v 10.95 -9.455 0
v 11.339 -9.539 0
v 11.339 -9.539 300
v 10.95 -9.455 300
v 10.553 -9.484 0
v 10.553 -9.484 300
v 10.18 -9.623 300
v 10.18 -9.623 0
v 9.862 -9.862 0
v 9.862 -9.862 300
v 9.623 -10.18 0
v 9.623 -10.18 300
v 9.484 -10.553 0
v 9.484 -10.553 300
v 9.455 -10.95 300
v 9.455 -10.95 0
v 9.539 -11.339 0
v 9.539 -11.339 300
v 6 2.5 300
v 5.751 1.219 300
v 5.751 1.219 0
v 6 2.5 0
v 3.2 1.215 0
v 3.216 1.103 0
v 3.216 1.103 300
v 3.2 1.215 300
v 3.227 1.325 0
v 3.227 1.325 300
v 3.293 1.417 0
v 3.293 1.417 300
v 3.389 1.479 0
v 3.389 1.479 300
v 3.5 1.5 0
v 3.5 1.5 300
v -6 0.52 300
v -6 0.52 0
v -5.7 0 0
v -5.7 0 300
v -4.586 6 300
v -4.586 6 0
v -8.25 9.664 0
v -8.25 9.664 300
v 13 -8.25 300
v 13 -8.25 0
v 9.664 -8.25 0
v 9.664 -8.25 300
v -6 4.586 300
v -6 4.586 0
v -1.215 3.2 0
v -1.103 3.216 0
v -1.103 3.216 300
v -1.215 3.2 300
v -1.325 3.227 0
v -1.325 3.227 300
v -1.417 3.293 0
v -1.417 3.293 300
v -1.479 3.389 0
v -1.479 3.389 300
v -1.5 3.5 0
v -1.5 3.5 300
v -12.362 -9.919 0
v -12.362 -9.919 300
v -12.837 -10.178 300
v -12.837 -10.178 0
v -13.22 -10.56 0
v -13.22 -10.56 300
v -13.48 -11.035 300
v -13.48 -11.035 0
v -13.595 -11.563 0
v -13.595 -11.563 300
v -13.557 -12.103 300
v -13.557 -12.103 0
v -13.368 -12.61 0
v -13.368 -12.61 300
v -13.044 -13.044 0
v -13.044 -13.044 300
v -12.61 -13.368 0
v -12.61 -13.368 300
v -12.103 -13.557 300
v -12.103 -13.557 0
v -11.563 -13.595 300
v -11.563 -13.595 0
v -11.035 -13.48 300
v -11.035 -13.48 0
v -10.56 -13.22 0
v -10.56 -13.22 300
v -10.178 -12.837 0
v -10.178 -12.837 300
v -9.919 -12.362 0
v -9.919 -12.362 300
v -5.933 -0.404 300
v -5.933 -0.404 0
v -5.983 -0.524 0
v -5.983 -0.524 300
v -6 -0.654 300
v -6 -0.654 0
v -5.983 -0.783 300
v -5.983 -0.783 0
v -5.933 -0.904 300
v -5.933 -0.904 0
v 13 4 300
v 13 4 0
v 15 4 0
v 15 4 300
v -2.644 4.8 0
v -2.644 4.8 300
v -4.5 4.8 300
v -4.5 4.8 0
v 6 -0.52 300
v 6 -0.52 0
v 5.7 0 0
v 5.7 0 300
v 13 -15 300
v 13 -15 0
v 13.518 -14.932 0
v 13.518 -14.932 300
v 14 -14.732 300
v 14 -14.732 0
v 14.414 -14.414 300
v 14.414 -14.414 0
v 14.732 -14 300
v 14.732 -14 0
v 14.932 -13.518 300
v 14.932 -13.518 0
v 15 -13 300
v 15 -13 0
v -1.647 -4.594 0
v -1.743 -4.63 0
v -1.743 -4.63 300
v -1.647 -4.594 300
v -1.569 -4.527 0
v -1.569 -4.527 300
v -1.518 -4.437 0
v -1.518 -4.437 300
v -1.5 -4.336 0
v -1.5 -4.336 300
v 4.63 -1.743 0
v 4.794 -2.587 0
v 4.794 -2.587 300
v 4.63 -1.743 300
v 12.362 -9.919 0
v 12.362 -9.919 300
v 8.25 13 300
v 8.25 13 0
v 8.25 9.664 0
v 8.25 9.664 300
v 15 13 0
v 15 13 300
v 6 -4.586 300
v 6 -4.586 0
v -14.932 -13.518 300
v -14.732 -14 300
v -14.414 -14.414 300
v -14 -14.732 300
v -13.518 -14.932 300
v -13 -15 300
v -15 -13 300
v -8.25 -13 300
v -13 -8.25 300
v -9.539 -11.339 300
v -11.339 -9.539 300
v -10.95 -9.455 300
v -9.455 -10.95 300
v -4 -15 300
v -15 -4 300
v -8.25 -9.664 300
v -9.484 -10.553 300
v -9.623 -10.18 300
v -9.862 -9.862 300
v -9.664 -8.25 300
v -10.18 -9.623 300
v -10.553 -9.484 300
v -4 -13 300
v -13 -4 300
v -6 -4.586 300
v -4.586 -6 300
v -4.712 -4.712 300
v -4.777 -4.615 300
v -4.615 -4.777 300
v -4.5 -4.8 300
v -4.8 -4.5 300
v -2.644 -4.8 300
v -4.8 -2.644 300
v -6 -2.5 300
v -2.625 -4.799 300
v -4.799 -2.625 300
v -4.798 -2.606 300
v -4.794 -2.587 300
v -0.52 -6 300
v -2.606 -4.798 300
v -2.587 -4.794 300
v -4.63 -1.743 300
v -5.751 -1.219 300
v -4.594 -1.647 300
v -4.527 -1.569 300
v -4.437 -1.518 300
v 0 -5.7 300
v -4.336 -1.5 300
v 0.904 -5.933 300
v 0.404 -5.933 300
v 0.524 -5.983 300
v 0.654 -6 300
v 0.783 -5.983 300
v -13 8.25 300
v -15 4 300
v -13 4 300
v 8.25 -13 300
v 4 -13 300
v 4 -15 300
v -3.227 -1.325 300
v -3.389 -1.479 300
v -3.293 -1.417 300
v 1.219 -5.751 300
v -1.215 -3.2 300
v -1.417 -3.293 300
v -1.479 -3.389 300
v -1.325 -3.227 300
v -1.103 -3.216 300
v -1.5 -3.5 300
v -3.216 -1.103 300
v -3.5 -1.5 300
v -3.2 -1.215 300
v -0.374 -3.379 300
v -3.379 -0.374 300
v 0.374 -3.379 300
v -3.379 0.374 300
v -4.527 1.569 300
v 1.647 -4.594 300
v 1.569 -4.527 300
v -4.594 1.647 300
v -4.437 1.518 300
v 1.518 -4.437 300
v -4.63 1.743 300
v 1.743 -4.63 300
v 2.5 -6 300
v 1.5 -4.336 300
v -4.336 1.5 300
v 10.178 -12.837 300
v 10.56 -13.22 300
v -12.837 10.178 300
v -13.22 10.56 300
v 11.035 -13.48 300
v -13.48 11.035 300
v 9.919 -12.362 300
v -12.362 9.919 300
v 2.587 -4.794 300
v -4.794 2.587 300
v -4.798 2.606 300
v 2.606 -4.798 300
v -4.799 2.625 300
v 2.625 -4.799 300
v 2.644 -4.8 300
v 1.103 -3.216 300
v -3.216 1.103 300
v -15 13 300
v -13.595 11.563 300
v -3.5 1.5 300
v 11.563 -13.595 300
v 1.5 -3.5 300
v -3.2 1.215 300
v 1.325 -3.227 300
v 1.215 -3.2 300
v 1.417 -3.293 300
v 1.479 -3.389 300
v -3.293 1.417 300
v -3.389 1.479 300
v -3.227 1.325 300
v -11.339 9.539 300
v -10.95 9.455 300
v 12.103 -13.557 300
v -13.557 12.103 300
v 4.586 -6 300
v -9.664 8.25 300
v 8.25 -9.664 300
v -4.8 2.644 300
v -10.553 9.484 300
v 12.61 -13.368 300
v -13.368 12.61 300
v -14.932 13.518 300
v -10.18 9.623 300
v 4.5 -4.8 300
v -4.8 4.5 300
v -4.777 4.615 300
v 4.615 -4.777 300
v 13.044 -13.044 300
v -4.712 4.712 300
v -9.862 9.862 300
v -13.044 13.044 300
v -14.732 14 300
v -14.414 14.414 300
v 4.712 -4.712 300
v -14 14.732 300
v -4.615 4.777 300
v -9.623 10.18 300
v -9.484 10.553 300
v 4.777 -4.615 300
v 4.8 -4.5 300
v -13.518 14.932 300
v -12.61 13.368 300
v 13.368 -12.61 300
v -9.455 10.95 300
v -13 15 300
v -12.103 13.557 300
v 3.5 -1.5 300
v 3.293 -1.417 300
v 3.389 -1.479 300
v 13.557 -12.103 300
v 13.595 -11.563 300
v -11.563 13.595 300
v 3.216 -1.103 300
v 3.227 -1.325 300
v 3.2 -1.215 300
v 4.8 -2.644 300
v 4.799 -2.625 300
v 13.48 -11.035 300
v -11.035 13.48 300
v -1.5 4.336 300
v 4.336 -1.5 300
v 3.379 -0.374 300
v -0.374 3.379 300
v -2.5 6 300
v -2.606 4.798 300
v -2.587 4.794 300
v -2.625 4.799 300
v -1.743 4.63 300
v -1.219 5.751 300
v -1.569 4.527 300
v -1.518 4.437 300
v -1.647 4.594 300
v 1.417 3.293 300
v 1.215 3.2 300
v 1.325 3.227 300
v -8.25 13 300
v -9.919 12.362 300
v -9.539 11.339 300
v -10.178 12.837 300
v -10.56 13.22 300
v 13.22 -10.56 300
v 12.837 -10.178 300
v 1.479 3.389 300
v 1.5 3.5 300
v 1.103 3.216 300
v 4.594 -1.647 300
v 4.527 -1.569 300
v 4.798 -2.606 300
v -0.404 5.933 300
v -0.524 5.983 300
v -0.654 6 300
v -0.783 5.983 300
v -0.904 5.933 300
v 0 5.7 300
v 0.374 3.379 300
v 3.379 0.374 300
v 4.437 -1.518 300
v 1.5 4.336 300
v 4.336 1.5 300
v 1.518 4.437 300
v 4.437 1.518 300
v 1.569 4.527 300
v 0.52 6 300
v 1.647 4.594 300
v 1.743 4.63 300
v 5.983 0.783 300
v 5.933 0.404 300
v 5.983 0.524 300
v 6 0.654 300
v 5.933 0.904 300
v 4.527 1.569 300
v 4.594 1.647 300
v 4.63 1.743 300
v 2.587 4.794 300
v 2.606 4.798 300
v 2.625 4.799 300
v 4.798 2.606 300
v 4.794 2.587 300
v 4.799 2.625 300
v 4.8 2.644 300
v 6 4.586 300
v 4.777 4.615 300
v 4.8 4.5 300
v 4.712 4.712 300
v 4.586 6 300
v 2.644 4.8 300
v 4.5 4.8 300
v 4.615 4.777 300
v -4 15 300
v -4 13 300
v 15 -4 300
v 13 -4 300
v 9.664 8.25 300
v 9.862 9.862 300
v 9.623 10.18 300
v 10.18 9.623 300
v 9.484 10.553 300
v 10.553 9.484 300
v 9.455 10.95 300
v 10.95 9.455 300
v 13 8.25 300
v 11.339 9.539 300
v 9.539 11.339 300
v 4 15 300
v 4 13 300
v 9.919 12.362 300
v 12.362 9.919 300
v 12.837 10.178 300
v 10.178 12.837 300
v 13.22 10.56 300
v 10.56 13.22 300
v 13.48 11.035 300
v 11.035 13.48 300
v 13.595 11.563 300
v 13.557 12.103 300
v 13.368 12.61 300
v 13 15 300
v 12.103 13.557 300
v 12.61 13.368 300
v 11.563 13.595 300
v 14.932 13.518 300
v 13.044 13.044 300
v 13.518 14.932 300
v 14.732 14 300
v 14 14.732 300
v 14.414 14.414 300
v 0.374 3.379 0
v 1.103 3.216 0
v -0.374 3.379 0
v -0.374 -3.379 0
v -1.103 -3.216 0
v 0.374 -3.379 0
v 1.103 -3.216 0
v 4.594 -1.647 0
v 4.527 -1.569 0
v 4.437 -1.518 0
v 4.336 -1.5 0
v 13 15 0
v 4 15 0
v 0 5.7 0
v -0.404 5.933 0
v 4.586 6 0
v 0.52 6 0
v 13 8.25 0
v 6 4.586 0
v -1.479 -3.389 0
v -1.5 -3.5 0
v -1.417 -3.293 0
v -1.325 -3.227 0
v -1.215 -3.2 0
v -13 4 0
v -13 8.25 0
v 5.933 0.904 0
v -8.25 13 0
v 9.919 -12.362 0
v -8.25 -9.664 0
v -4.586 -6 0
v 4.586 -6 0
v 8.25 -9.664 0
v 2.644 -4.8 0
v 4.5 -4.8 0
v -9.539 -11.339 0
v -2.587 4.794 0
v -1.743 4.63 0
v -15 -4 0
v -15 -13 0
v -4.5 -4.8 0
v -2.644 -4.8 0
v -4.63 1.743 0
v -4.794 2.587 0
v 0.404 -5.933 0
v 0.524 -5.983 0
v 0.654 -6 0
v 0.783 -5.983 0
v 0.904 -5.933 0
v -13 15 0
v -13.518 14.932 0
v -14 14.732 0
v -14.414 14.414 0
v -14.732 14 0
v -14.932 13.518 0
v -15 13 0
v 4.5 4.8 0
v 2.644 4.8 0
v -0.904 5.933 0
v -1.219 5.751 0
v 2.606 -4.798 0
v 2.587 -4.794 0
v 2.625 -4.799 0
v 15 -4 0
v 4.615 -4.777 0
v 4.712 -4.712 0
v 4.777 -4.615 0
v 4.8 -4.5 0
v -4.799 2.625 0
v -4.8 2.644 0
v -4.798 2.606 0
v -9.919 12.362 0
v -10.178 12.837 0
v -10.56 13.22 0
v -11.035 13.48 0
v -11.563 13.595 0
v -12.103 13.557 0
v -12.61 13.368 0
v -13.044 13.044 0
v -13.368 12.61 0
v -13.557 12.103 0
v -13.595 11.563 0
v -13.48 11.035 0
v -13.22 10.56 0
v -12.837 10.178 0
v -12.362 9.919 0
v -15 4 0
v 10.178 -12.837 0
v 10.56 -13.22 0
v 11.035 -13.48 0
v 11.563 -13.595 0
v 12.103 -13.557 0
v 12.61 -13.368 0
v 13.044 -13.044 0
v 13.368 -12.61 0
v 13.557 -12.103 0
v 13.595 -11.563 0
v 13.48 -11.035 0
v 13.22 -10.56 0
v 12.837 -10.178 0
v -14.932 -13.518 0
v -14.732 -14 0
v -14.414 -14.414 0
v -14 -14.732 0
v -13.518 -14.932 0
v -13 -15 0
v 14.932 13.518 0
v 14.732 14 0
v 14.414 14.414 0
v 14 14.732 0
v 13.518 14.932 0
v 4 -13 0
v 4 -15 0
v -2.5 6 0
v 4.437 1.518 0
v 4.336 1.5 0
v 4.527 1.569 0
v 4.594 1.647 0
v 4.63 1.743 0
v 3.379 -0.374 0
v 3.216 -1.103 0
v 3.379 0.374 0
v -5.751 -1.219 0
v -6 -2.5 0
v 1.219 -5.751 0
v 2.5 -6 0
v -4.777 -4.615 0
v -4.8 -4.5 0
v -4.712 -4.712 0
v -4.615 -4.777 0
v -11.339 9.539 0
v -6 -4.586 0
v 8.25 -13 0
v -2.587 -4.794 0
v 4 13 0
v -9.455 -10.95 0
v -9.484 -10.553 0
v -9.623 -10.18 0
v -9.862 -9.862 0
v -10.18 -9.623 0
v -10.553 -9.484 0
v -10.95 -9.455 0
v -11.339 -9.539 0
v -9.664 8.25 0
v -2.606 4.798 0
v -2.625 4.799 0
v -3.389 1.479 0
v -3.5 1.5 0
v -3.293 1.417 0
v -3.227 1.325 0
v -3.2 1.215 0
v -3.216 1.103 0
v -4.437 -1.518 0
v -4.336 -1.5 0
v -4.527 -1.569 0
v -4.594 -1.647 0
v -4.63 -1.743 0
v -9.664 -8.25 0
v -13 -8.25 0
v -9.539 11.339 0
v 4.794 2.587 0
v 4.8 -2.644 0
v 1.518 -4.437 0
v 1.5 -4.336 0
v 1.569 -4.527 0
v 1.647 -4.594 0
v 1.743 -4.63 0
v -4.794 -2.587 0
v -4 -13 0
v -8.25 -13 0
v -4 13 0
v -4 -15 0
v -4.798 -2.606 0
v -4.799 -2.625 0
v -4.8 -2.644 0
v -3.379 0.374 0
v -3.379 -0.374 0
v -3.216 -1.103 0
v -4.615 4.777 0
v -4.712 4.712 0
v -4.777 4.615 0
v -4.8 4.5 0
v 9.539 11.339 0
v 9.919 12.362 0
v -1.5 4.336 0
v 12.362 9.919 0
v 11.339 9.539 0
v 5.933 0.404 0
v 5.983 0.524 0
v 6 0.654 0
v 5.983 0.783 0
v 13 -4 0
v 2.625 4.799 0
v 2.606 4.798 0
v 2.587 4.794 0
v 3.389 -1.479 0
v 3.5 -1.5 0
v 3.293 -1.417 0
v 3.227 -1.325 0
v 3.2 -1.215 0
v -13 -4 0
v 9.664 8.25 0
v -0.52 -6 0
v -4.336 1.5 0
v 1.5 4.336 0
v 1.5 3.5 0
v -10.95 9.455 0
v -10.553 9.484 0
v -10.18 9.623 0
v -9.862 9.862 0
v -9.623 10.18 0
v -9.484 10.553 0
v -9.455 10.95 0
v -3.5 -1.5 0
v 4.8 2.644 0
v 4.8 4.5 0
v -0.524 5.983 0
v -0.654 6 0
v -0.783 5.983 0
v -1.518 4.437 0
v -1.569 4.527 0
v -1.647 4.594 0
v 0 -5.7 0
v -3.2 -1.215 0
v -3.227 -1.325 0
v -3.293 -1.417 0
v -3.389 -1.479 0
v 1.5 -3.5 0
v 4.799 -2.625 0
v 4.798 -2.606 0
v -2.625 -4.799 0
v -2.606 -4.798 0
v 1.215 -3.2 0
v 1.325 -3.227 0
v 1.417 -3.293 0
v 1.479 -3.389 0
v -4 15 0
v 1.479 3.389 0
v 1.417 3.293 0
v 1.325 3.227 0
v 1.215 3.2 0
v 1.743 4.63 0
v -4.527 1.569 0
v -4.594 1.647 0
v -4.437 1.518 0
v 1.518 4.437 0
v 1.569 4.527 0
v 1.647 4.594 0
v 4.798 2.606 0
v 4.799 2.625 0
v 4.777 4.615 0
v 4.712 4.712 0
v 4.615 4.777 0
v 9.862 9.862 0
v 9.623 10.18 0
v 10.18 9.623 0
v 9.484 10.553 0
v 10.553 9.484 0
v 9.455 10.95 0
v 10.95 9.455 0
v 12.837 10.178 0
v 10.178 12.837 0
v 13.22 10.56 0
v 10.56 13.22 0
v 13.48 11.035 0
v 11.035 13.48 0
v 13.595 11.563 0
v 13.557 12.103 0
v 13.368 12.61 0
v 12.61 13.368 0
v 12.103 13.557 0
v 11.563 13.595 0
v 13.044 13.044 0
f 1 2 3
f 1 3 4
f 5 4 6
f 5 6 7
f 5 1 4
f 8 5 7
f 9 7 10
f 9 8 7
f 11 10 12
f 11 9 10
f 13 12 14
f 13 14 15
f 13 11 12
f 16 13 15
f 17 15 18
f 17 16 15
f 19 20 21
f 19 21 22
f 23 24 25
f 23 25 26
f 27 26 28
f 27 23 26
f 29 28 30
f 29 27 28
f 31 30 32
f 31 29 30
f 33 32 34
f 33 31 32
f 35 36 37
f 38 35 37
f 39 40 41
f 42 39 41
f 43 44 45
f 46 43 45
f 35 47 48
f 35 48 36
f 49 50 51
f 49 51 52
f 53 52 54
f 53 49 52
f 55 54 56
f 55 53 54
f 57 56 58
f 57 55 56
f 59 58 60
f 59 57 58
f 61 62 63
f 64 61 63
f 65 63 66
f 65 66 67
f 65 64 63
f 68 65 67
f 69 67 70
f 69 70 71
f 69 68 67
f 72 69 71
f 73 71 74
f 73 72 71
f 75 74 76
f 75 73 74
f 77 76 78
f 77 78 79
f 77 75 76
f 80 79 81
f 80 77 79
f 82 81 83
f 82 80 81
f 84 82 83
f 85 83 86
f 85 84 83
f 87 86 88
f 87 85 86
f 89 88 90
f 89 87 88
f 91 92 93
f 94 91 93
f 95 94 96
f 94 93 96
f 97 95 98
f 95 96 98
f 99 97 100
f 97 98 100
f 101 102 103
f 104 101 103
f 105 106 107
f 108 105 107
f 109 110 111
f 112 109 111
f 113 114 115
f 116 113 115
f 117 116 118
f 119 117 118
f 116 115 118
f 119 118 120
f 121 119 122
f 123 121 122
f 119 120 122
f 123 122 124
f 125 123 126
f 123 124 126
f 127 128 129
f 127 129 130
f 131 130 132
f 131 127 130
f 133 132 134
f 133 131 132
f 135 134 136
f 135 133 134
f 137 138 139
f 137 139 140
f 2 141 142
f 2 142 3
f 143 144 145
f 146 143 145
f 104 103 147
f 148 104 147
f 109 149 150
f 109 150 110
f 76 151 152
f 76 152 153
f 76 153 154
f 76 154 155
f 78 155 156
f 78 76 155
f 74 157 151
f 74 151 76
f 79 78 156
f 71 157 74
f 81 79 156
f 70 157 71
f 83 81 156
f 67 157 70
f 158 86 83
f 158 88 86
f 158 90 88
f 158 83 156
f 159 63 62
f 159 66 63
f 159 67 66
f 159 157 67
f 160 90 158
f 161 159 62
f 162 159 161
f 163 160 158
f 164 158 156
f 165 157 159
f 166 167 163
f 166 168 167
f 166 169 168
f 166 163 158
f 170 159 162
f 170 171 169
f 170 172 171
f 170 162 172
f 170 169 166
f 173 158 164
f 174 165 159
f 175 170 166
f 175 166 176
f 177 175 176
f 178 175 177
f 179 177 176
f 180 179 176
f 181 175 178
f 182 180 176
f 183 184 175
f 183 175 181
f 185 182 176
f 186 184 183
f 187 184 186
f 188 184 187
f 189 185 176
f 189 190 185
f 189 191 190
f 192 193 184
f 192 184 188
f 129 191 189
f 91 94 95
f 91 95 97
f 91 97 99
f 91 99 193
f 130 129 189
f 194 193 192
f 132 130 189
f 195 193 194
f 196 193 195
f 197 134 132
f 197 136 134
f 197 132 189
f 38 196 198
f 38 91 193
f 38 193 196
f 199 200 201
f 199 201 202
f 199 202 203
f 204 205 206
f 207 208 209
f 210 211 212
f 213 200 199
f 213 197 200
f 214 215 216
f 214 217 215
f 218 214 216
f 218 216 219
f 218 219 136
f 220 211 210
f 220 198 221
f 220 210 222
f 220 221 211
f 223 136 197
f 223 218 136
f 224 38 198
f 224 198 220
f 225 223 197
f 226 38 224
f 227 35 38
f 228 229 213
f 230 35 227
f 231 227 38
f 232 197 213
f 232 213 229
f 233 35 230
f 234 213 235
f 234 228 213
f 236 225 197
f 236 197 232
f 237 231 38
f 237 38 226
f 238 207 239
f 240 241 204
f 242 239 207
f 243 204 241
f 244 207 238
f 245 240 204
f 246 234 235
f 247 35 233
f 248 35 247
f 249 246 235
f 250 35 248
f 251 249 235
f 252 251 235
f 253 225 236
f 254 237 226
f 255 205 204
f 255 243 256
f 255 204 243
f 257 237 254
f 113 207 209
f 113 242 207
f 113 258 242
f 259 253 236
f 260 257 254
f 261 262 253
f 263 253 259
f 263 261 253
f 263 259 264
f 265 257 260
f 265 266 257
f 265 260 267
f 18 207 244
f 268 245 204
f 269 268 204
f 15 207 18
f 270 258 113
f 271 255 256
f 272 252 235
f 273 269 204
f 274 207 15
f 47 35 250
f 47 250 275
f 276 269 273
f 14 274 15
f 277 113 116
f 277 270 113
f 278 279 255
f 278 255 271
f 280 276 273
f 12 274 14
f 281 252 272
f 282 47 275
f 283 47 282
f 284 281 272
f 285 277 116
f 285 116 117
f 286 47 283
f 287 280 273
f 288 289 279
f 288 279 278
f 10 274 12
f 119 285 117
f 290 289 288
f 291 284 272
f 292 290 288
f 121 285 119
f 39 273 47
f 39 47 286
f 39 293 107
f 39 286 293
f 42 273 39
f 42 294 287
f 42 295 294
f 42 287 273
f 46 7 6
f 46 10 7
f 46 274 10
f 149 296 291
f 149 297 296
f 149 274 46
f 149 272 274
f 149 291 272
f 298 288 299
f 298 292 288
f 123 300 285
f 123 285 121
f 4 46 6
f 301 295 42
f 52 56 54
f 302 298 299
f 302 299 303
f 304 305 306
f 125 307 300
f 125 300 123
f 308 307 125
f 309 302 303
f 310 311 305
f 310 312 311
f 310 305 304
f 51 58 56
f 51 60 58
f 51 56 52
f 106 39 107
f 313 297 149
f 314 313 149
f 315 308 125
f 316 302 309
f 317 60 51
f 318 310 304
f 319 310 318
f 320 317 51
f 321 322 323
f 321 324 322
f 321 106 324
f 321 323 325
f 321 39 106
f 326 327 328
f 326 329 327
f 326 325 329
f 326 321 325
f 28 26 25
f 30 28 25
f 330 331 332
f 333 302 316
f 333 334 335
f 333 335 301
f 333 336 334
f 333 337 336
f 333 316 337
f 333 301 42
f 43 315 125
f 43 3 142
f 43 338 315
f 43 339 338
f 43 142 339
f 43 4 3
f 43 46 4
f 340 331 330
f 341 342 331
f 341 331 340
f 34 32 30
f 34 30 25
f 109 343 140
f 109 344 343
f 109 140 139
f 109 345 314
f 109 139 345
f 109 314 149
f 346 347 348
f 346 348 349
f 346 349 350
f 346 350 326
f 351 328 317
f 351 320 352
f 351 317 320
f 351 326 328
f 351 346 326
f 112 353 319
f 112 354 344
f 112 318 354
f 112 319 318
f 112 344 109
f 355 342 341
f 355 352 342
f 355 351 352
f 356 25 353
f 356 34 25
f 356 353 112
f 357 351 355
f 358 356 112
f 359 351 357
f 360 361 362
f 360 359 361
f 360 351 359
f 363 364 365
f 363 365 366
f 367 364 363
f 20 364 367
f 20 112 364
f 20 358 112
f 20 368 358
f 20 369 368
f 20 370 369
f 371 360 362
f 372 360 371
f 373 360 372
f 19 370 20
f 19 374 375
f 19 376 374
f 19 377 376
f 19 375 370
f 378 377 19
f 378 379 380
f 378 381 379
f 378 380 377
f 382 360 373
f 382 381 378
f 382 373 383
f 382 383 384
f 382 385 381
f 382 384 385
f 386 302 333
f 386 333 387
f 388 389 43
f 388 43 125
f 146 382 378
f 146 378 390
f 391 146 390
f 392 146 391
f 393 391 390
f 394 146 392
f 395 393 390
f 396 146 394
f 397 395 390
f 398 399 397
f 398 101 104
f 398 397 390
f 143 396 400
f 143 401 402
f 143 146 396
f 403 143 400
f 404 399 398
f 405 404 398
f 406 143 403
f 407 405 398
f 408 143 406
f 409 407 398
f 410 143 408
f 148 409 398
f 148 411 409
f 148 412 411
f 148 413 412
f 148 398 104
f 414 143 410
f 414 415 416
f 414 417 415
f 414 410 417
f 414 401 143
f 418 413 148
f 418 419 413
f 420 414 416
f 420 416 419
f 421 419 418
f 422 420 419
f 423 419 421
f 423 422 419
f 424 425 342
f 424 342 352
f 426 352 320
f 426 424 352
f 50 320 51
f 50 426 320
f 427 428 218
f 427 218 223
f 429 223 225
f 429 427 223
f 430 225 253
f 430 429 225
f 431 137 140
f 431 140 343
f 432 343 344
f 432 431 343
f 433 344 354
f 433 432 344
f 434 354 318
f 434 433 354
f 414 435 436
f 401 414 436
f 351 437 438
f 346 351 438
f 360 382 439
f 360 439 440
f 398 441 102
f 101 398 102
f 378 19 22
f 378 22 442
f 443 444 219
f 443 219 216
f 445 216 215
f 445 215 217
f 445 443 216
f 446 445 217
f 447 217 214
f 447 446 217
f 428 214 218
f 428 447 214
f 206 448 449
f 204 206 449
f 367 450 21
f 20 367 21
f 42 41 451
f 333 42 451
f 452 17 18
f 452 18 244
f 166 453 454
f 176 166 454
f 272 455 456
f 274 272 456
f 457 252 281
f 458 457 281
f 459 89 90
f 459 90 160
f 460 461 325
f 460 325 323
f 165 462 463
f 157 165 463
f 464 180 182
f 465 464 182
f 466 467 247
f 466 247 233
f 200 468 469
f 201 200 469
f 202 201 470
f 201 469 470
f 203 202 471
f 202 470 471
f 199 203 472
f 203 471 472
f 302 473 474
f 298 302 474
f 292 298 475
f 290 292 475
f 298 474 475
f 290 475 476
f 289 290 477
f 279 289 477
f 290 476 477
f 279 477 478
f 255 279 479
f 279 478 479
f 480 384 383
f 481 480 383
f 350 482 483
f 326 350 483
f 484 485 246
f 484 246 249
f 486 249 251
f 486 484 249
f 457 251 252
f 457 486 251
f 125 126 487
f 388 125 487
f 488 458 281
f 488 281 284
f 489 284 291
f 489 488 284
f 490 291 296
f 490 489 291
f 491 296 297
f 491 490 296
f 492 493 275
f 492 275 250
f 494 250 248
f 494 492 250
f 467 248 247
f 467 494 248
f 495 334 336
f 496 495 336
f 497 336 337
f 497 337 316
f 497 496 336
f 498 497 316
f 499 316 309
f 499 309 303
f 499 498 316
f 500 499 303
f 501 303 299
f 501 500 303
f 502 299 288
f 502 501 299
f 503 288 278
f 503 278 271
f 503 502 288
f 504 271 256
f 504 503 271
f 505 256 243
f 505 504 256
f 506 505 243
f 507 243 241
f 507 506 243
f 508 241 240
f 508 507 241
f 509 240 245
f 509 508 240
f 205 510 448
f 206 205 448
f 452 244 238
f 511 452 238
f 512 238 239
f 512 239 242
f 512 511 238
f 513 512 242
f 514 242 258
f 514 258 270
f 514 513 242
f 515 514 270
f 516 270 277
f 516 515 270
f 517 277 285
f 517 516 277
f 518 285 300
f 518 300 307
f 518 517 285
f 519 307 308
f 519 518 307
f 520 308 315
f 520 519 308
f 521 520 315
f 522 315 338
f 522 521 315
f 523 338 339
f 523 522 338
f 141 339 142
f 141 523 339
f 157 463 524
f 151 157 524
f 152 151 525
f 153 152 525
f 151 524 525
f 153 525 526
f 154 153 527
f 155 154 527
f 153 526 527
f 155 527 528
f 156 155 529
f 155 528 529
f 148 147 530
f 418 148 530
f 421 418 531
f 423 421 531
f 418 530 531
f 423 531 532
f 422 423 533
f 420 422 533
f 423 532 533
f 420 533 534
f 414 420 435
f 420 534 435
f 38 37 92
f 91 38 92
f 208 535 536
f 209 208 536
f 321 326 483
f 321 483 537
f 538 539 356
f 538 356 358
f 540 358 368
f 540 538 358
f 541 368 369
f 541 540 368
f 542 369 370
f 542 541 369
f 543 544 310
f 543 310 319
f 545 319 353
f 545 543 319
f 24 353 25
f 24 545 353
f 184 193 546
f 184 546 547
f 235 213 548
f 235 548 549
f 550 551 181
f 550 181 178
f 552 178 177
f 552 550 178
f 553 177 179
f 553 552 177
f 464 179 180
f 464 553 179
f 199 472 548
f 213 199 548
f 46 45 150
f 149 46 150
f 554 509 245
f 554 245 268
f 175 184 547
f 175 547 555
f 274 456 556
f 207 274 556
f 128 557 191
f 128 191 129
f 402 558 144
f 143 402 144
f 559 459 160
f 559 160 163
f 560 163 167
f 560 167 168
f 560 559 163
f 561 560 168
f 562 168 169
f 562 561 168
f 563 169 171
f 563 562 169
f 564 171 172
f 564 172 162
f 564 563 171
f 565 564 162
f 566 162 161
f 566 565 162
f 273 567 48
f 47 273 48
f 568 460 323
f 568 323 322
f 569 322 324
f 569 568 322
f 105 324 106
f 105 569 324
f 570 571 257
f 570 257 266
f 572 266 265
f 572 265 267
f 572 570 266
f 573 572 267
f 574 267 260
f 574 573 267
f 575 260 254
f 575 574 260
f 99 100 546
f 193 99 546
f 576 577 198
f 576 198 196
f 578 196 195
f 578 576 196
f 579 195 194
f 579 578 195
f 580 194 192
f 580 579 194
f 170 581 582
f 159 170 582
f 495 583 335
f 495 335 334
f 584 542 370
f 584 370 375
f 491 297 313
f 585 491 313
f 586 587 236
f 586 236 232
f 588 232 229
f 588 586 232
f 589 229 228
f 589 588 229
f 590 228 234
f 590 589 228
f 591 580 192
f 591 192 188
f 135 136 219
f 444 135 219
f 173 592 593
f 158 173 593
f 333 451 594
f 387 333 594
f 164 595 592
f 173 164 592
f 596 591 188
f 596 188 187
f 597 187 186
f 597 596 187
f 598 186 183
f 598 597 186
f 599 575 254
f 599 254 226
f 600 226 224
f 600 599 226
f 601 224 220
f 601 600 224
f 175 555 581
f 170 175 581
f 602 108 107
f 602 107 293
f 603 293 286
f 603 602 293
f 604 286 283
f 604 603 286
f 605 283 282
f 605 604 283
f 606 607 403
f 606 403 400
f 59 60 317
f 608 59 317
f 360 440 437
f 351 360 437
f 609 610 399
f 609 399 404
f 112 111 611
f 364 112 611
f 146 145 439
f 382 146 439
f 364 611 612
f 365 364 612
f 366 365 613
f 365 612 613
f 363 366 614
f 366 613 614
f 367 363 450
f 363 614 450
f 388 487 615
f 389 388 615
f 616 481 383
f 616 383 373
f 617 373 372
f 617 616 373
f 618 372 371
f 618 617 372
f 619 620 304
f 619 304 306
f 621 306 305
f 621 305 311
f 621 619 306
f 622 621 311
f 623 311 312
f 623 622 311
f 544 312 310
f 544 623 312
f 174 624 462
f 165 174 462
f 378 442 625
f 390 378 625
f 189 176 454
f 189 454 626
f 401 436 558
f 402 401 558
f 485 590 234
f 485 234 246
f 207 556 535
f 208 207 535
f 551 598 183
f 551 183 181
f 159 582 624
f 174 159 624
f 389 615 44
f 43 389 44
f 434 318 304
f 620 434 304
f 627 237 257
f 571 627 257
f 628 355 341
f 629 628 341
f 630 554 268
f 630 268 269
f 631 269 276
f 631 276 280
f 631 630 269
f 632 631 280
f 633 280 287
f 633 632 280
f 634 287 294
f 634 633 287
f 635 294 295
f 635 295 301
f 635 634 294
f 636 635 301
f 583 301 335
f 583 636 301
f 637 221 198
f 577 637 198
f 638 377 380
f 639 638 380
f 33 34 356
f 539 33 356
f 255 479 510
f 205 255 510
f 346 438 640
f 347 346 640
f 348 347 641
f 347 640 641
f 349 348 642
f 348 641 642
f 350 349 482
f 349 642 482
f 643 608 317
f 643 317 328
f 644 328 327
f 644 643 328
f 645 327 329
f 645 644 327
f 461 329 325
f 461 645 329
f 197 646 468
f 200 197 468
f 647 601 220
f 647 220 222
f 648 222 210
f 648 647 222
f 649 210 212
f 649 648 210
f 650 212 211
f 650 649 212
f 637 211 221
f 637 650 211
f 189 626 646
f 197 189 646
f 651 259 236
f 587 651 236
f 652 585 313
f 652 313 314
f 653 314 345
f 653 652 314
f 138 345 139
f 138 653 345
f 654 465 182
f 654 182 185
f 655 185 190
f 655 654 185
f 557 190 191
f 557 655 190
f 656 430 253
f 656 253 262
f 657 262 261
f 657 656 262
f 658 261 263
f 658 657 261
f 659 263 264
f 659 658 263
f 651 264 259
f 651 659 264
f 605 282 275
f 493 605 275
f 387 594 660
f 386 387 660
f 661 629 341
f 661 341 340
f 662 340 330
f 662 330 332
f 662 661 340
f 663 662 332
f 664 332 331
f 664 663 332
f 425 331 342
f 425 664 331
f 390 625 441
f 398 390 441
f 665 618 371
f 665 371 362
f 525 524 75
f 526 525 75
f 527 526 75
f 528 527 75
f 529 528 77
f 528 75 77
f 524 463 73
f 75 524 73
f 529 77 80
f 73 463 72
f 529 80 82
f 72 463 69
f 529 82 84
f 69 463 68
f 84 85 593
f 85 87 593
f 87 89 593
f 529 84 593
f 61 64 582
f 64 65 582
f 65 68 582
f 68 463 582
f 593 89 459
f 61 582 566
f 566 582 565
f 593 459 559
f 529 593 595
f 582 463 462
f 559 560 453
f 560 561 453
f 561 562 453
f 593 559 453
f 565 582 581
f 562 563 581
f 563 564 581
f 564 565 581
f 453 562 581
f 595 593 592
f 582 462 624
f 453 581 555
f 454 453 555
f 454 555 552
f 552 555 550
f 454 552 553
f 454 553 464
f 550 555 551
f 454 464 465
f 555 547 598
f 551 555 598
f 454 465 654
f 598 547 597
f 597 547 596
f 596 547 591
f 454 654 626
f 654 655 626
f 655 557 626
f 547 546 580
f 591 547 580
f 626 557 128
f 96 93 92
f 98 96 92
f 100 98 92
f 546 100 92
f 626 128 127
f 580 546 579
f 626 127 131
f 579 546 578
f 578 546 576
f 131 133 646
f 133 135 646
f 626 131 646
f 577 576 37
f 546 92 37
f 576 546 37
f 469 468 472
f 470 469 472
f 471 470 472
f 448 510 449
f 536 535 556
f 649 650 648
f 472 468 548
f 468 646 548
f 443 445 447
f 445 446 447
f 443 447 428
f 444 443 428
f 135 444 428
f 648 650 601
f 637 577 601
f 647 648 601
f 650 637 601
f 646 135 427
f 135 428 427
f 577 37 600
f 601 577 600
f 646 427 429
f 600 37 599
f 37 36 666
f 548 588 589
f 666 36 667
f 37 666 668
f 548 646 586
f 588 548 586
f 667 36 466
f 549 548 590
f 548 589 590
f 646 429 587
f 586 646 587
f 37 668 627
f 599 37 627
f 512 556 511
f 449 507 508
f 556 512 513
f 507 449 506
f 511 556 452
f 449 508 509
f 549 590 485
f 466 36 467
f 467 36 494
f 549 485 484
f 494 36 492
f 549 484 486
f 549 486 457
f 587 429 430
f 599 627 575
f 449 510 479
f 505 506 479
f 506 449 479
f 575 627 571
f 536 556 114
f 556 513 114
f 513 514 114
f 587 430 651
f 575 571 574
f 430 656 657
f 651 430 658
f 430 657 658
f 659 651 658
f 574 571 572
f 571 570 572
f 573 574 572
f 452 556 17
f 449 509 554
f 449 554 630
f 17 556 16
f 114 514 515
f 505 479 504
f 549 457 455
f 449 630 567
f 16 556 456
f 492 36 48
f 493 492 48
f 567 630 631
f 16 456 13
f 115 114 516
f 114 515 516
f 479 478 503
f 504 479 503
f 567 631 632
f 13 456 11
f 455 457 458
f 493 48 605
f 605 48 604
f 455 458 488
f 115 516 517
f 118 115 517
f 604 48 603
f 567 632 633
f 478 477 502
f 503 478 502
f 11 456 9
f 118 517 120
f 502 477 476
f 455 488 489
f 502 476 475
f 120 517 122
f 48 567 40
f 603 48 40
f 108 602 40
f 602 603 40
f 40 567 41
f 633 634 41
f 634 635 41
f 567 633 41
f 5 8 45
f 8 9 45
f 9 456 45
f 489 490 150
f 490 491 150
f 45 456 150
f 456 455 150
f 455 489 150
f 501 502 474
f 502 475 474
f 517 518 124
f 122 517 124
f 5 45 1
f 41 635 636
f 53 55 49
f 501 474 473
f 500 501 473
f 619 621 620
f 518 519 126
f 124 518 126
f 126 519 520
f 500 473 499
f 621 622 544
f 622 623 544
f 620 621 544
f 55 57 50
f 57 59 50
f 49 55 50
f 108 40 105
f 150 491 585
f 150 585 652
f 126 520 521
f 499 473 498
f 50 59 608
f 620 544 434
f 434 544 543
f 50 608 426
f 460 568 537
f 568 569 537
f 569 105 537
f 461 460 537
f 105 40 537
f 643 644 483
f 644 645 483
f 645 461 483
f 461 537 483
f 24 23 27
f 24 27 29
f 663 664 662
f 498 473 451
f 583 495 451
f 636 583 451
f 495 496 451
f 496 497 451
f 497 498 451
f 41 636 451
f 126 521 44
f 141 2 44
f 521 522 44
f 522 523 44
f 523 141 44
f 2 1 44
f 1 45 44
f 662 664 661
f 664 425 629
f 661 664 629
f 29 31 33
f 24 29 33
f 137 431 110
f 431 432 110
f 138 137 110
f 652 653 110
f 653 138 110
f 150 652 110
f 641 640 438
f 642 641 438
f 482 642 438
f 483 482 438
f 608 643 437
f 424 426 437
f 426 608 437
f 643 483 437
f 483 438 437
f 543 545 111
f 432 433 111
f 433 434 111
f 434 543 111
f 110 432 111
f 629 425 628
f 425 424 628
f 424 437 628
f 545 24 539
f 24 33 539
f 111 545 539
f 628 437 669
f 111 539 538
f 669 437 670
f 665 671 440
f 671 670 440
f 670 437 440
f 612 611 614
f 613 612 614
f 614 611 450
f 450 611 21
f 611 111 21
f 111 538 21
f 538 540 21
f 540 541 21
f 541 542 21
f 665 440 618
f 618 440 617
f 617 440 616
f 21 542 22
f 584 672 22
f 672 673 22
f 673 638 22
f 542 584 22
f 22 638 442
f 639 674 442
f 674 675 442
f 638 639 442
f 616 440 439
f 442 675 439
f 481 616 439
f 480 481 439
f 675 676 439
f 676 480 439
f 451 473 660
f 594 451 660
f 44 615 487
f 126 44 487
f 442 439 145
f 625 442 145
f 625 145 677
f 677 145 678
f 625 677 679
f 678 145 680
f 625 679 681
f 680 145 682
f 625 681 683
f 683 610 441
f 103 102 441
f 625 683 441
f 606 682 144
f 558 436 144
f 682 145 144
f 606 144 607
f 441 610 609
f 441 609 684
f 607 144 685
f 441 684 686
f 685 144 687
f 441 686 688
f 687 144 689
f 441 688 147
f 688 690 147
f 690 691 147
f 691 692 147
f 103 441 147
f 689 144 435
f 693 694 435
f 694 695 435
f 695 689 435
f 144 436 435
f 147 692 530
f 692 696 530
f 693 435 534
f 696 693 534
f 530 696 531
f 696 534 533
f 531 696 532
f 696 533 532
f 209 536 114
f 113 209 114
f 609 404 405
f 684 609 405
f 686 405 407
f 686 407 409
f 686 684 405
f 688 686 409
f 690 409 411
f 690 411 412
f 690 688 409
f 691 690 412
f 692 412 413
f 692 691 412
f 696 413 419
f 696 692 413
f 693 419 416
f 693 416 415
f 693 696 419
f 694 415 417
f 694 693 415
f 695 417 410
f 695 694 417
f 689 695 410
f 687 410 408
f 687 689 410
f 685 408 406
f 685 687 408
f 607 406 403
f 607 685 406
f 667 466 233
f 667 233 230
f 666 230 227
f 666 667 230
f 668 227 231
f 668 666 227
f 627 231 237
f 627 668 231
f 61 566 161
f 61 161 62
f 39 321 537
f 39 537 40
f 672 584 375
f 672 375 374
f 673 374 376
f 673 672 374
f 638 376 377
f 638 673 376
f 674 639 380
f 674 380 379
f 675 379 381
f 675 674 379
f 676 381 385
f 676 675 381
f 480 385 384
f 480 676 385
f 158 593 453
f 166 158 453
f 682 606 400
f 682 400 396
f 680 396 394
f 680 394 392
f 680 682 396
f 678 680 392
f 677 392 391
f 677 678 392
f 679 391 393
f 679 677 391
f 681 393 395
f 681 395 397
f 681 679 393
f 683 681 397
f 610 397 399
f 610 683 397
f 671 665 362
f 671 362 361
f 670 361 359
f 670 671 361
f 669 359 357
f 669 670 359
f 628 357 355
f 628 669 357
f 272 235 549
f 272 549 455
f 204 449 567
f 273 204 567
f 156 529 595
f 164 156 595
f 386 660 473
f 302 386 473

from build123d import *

# Parameters (mm, degrees)
BOSS_EXTRUDE1_DEPTH = 300


with BuildPart() as part:
    # Model → Boss-Extrude1 (new body)
    with BuildSketch(Plane.XY):
        with BuildLine():
            Line((-15, 13), (-15, 4))
            Line((-15, 4), (-13, 4))
            Line((-13, 4), (-13, 8.25))
            Line((-13, 8.25), (-9.664213562, 8.25))
            Line((-9.664213562, 8.25), (-6, 4.585786438))
            Line((-6, 4.585786438), (-6, 0.519615242))
            Line((-6, 0.519615242), (-5.7, 0))
            Line((-5.7, 0), (-5.933012702, -0.403589838))
            ThreePointArc((-5.933012702, -0.403589838), (-6, -0.653589838), (-5.933012702, -0.903589838))
            Line((-5.933012702, -0.903589838), (-5.750976592, -1.218885629))
            Line((-5.750976592, -1.218885629), (-6, -2.5))
            Line((-6, -2.5), (-6, -4.585786438))
            Line((-6, -4.585786438), (-9.664213562, -8.25))
            Line((-9.664213562, -8.25), (-13, -8.25))
            Line((-13, -8.25), (-13, -4))
            Line((-13, -4), (-15, -4))
            Line((-15, -4), (-15, -13))
            ThreePointArc((-15, -13), (-14.414213562, -14.414213562), (-13, -15))
            Line((-13, -15), (-4, -15))
            Line((-4, -15), (-4, -13))
            Line((-4, -13), (-8.25, -13))
            Line((-8.25, -13), (-8.25, -9.664213562))
            Line((-8.25, -9.664213562), (-4.585786438, -6))
            Line((-4.585786438, -6), (-0.519615242, -6))
            Line((-0.519615242, -6), (0, -5.7))
            Line((0, -5.7), (0.403589838, -5.933012702))
            ThreePointArc((0.403589838, -5.933012702), (0.653589838, -6), (0.903589838, -5.933012702))
            Line((0.903589838, -5.933012702), (1.218885629, -5.750976592))
            Line((1.218885629, -5.750976592), (2.5, -6))
            Line((2.5, -6), (4.585786438, -6))
            Line((4.585786438, -6), (8.25, -9.664213562))
            Line((8.25, -9.664213562), (8.25, -13))
            Line((8.25, -13), (4, -13))
            Line((4, -13), (4, -15))
            Line((4, -15), (13, -15))
            ThreePointArc((13, -15), (14.414213562, -14.414213562), (15, -13))
            Line((15, -13), (15, -4))
            Line((15, -4), (13, -4))
            Line((13, -4), (13, -8.25))
            Line((13, -8.25), (9.664213562, -8.25))
            Line((9.664213562, -8.25), (6, -4.585786438))
            Line((6, -4.585786438), (6, -0.519615242))
            Line((6, -0.519615242), (5.7, 0))
            Line((5.7, 0), (5.933012702, 0.403589838))
            ThreePointArc((5.933012702, 0.403589838), (6, 0.653589838), (5.933012702, 0.903589838))
            Line((5.933012702, 0.903589838), (5.750976592, 1.218885629))
            Line((5.750976592, 1.218885629), (6, 2.5))
            Line((6, 2.5), (6, 4.585786438))
            Line((6, 4.585786438), (9.664213562, 8.25))
            Line((9.664213562, 8.25), (13, 8.25))
            Line((13, 8.25), (13, 4))
            Line((13, 4), (15, 4))
            Line((15, 4), (15, 13))
            ThreePointArc((15, 13), (14.414213562, 14.414213562), (13, 15))
            Line((13, 15), (4, 15))
            Line((4, 15), (4, 13))
            Line((4, 13), (8.25, 13))
            Line((8.25, 13), (8.25, 9.664213562))
            Line((8.25, 9.664213562), (4.585786438, 6))
            Line((4.585786438, 6), (0.519615242, 6))
            Line((0.519615242, 6), (0, 5.7))
            Line((0, 5.7), (-0.403589838, 5.933012702))
            ThreePointArc((-0.403589838, 5.933012702), (-0.653589838, 6), (-0.903589838, 5.933012702))
            Line((-0.903589838, 5.933012702), (-1.218885629, 5.750976592))
            Line((-1.218885629, 5.750976592), (-2.5, 6))
            Line((-2.5, 6), (-4.585786438, 6))
            Line((-4.585786438, 6), (-8.25, 9.664213562))
            Line((-8.25, 9.664213562), (-8.25, 13))
            Line((-8.25, 13), (-4, 13))
            Line((-4, 13), (-4, 15))
            Line((-4, 15), (-13, 15))
            ThreePointArc((-13, 15), (-14.414213562, 14.414213562), (-15, 13))
        make_face()
        with BuildLine():
            Line((9.918883282, 12.361530981), (9.539070071, 11.338915743))
            ThreePointArc((9.539070071, 11.338915743), (9.861522369, 9.861522369), (11.338915743, 9.539070071))
            Line((11.338915743, 9.539070071), (12.361530981, 9.918883282))
            ThreePointArc((12.361530981, 9.918883282), (13.043502884, 13.043502884), (9.918883282, 12.361530981))
        make_face(mode=Mode.SUBTRACT)
        with BuildLine():
            Line((12.361530981, -9.918883282), (11.338915743, -9.539070071))
            ThreePointArc((11.338915743, -9.539070071), (9.861522369, -9.861522369), (9.539070071, -11.338915743))
            Line((9.539070071, -11.338915743), (9.918883282, -12.361530981))
            ThreePointArc((9.918883282, -12.361530981), (13.043502884, -13.043502884), (12.361530981, -9.918883282))
        make_face(mode=Mode.SUBTRACT)
        with BuildLine():
            Line((-9.539070071, 11.338915743), (-9.918883282, 12.361530981))
            ThreePointArc((-9.918883282, 12.361530981), (-13.043502884, 13.043502884), (-12.361530981, 9.918883282))
            Line((-12.361530981, 9.918883282), (-11.338915743, 9.539070071))
            ThreePointArc((-11.338915743, 9.539070071), (-9.861522369, 9.861522369), (-9.539070071, 11.338915743))
        make_face(mode=Mode.SUBTRACT)
        with BuildLine():
            Line((-11.338915743, -9.539070071), (-12.361530981, -9.918883282))
            ThreePointArc((-12.361530981, -9.918883282), (-13.043502884, -13.043502884), (-9.918883282, -12.361530981))
            Line((-9.918883282, -12.361530981), (-9.539070071, -11.338915743))
            ThreePointArc((-9.539070071, -11.338915743), (-9.861522369, -9.861522369), (-11.338915743, -9.539070071))
        make_face(mode=Mode.SUBTRACT)
        with BuildLine():
            Line((1.5, 4.335858741), (1.5, 3.5))
            ThreePointArc((1.5, 3.5), (1.374371466, 3.255879964), (1.10270272, 3.21621621))
            ThreePointArc((1.10270272, 3.21621621), (9e-09, 3.4), (-1.102702703, 3.216216216))
            ThreePointArc((-1.102702703, 3.216216216), (-1.374371458, 3.255879959), (-1.5, 3.5))
            Line((-1.5, 3.5), (-1.5, 4.335858741))
            ThreePointArc((-1.5, 4.335858741), (-1.568512625, 4.526682207), (-1.742757301, 4.630346896))
            Line((-1.742757301, 4.630346896), (-2.587190874, 4.794488155))
            ThreePointArc((-2.587190874, 4.794488155), (-2.615679847, 4.79861886), (-2.644433572, 4.8))
            Line((-2.644433572, 4.8), (-4.5, 4.8))
            ThreePointArc((-4.5, 4.8), (-4.712132034, 4.712132034), (-4.8, 4.5))
            Line((-4.8, 4.5), (-4.8, 2.644433572))
            ThreePointArc((-4.8, 2.644433572), (-4.79861886, 2.615679847), (-4.794488155, 2.587190874))
            Line((-4.794488155, 2.587190874), (-4.630346896, 1.742757301))
            ThreePointArc((-4.630346896, 1.742757301), (-4.526682207, 1.568512625), (-4.335858741, 1.5))
            Line((-4.335858741, 1.5), (-3.5, 1.5))
            ThreePointArc((-3.5, 1.5), (-3.255879964, 1.374371466), (-3.21621621, 1.10270272))
            ThreePointArc((-3.21621621, 1.10270272), (-3.4, 9e-09), (-3.216216216, -1.102702703))
            ThreePointArc((-3.216216216, -1.102702703), (-3.255879959, -1.374371458), (-3.5, -1.5))
            Line((-3.5, -1.5), (-4.335858741, -1.5))
            ThreePointArc((-4.335858741, -1.5), (-4.526682207, -1.568512625), (-4.630346896, -1.742757301))
            Line((-4.630346896, -1.742757301), (-4.794488155, -2.587190874))
            ThreePointArc((-4.794488155, -2.587190874), (-4.798618859, -2.615679844), (-4.8, -2.644433568))
            Line((-4.8, -2.644433568), (-4.8, -4.5))
            ThreePointArc((-4.8, -4.5), (-4.712132034, -4.712132034), (-4.5, -4.8))
            Line((-4.5, -4.8), (-2.644433572, -4.8))
            ThreePointArc((-2.644433572, -4.8), (-2.615679847, -4.79861886), (-2.587190874, -4.794488155))
            Line((-2.587190874, -4.794488155), (-1.742757301, -4.630346896))
            ThreePointArc((-1.742757301, -4.630346896), (-1.568512625, -4.526682207), (-1.5, -4.335858741))
            Line((-1.5, -4.335858741), (-1.5, -3.5))
            ThreePointArc((-1.5, -3.5), (-1.374371466, -3.255879964), (-1.10270272, -3.21621621))
            ThreePointArc((-1.10270272, -3.21621621), (-9e-09, -3.4), (1.102702703, -3.216216216))
            ThreePointArc((1.102702703, -3.216216216), (1.374371458, -3.255879959), (1.5, -3.5))
            Line((1.5, -3.5), (1.5, -4.335858741))
            ThreePointArc((1.5, -4.335858741), (1.568512625, -4.526682207), (1.742757301, -4.630346896))
            Line((1.742757301, -4.630346896), (2.587190874, -4.794488155))
            ThreePointArc((2.587190874, -4.794488155), (2.615679847, -4.79861886), (2.644433572, -4.8))
            Line((2.644433572, -4.8), (4.5, -4.8))
            ThreePointArc((4.5, -4.8), (4.712132034, -4.712132034), (4.8, -4.5))
            Line((4.8, -4.5), (4.8, -2.644433572))
            ThreePointArc((4.8, -2.644433572), (4.79861886, -2.615679847), (4.794488155, -2.587190874))
            Line((4.794488155, -2.587190874), (4.630346896, -1.742757301))
            ThreePointArc((4.630346896, -1.742757301), (4.526682207, -1.568512625), (4.335858741, -1.5))
            Line((4.335858741, -1.5), (3.5, -1.5))
            ThreePointArc((3.5, -1.5), (3.255879964, -1.374371466), (3.21621621, -1.10270272))
            ThreePointArc((3.21621621, -1.10270272), (3.4, -9e-09), (3.216216216, 1.102702703))
            ThreePointArc((3.216216216, 1.102702703), (3.255879959, 1.374371458), (3.5, 1.5))
            Line((3.5, 1.5), (4.335858741, 1.5))
            ThreePointArc((4.335858741, 1.5), (4.526682207, 1.568512625), (4.630346896, 1.742757301))
            Line((4.630346896, 1.742757301), (4.794488155, 2.587190874))
            ThreePointArc((4.794488155, 2.587190874), (4.79861886, 2.615679849), (4.8, 2.644433577))
            Line((4.8, 2.644433577), (4.8, 4.5))
            ThreePointArc((4.8, 4.5), (4.712132034, 4.712132034), (4.5, 4.8))
            Line((4.5, 4.8), (2.644433572, 4.8))
            ThreePointArc((2.644433572, 4.8), (2.615679847, 4.79861886), (2.587190874, 4.794488155))
            Line((2.587190874, 4.794488155), (1.742757301, 4.630346896))
            ThreePointArc((1.742757301, 4.630346896), (1.568512625, 4.526682207), (1.5, 4.335858741))
        make_face(mode=Mode.SUBTRACT)
    extrude(amount=BOSS_EXTRUDE1_DEPTH)


solid = part.part
